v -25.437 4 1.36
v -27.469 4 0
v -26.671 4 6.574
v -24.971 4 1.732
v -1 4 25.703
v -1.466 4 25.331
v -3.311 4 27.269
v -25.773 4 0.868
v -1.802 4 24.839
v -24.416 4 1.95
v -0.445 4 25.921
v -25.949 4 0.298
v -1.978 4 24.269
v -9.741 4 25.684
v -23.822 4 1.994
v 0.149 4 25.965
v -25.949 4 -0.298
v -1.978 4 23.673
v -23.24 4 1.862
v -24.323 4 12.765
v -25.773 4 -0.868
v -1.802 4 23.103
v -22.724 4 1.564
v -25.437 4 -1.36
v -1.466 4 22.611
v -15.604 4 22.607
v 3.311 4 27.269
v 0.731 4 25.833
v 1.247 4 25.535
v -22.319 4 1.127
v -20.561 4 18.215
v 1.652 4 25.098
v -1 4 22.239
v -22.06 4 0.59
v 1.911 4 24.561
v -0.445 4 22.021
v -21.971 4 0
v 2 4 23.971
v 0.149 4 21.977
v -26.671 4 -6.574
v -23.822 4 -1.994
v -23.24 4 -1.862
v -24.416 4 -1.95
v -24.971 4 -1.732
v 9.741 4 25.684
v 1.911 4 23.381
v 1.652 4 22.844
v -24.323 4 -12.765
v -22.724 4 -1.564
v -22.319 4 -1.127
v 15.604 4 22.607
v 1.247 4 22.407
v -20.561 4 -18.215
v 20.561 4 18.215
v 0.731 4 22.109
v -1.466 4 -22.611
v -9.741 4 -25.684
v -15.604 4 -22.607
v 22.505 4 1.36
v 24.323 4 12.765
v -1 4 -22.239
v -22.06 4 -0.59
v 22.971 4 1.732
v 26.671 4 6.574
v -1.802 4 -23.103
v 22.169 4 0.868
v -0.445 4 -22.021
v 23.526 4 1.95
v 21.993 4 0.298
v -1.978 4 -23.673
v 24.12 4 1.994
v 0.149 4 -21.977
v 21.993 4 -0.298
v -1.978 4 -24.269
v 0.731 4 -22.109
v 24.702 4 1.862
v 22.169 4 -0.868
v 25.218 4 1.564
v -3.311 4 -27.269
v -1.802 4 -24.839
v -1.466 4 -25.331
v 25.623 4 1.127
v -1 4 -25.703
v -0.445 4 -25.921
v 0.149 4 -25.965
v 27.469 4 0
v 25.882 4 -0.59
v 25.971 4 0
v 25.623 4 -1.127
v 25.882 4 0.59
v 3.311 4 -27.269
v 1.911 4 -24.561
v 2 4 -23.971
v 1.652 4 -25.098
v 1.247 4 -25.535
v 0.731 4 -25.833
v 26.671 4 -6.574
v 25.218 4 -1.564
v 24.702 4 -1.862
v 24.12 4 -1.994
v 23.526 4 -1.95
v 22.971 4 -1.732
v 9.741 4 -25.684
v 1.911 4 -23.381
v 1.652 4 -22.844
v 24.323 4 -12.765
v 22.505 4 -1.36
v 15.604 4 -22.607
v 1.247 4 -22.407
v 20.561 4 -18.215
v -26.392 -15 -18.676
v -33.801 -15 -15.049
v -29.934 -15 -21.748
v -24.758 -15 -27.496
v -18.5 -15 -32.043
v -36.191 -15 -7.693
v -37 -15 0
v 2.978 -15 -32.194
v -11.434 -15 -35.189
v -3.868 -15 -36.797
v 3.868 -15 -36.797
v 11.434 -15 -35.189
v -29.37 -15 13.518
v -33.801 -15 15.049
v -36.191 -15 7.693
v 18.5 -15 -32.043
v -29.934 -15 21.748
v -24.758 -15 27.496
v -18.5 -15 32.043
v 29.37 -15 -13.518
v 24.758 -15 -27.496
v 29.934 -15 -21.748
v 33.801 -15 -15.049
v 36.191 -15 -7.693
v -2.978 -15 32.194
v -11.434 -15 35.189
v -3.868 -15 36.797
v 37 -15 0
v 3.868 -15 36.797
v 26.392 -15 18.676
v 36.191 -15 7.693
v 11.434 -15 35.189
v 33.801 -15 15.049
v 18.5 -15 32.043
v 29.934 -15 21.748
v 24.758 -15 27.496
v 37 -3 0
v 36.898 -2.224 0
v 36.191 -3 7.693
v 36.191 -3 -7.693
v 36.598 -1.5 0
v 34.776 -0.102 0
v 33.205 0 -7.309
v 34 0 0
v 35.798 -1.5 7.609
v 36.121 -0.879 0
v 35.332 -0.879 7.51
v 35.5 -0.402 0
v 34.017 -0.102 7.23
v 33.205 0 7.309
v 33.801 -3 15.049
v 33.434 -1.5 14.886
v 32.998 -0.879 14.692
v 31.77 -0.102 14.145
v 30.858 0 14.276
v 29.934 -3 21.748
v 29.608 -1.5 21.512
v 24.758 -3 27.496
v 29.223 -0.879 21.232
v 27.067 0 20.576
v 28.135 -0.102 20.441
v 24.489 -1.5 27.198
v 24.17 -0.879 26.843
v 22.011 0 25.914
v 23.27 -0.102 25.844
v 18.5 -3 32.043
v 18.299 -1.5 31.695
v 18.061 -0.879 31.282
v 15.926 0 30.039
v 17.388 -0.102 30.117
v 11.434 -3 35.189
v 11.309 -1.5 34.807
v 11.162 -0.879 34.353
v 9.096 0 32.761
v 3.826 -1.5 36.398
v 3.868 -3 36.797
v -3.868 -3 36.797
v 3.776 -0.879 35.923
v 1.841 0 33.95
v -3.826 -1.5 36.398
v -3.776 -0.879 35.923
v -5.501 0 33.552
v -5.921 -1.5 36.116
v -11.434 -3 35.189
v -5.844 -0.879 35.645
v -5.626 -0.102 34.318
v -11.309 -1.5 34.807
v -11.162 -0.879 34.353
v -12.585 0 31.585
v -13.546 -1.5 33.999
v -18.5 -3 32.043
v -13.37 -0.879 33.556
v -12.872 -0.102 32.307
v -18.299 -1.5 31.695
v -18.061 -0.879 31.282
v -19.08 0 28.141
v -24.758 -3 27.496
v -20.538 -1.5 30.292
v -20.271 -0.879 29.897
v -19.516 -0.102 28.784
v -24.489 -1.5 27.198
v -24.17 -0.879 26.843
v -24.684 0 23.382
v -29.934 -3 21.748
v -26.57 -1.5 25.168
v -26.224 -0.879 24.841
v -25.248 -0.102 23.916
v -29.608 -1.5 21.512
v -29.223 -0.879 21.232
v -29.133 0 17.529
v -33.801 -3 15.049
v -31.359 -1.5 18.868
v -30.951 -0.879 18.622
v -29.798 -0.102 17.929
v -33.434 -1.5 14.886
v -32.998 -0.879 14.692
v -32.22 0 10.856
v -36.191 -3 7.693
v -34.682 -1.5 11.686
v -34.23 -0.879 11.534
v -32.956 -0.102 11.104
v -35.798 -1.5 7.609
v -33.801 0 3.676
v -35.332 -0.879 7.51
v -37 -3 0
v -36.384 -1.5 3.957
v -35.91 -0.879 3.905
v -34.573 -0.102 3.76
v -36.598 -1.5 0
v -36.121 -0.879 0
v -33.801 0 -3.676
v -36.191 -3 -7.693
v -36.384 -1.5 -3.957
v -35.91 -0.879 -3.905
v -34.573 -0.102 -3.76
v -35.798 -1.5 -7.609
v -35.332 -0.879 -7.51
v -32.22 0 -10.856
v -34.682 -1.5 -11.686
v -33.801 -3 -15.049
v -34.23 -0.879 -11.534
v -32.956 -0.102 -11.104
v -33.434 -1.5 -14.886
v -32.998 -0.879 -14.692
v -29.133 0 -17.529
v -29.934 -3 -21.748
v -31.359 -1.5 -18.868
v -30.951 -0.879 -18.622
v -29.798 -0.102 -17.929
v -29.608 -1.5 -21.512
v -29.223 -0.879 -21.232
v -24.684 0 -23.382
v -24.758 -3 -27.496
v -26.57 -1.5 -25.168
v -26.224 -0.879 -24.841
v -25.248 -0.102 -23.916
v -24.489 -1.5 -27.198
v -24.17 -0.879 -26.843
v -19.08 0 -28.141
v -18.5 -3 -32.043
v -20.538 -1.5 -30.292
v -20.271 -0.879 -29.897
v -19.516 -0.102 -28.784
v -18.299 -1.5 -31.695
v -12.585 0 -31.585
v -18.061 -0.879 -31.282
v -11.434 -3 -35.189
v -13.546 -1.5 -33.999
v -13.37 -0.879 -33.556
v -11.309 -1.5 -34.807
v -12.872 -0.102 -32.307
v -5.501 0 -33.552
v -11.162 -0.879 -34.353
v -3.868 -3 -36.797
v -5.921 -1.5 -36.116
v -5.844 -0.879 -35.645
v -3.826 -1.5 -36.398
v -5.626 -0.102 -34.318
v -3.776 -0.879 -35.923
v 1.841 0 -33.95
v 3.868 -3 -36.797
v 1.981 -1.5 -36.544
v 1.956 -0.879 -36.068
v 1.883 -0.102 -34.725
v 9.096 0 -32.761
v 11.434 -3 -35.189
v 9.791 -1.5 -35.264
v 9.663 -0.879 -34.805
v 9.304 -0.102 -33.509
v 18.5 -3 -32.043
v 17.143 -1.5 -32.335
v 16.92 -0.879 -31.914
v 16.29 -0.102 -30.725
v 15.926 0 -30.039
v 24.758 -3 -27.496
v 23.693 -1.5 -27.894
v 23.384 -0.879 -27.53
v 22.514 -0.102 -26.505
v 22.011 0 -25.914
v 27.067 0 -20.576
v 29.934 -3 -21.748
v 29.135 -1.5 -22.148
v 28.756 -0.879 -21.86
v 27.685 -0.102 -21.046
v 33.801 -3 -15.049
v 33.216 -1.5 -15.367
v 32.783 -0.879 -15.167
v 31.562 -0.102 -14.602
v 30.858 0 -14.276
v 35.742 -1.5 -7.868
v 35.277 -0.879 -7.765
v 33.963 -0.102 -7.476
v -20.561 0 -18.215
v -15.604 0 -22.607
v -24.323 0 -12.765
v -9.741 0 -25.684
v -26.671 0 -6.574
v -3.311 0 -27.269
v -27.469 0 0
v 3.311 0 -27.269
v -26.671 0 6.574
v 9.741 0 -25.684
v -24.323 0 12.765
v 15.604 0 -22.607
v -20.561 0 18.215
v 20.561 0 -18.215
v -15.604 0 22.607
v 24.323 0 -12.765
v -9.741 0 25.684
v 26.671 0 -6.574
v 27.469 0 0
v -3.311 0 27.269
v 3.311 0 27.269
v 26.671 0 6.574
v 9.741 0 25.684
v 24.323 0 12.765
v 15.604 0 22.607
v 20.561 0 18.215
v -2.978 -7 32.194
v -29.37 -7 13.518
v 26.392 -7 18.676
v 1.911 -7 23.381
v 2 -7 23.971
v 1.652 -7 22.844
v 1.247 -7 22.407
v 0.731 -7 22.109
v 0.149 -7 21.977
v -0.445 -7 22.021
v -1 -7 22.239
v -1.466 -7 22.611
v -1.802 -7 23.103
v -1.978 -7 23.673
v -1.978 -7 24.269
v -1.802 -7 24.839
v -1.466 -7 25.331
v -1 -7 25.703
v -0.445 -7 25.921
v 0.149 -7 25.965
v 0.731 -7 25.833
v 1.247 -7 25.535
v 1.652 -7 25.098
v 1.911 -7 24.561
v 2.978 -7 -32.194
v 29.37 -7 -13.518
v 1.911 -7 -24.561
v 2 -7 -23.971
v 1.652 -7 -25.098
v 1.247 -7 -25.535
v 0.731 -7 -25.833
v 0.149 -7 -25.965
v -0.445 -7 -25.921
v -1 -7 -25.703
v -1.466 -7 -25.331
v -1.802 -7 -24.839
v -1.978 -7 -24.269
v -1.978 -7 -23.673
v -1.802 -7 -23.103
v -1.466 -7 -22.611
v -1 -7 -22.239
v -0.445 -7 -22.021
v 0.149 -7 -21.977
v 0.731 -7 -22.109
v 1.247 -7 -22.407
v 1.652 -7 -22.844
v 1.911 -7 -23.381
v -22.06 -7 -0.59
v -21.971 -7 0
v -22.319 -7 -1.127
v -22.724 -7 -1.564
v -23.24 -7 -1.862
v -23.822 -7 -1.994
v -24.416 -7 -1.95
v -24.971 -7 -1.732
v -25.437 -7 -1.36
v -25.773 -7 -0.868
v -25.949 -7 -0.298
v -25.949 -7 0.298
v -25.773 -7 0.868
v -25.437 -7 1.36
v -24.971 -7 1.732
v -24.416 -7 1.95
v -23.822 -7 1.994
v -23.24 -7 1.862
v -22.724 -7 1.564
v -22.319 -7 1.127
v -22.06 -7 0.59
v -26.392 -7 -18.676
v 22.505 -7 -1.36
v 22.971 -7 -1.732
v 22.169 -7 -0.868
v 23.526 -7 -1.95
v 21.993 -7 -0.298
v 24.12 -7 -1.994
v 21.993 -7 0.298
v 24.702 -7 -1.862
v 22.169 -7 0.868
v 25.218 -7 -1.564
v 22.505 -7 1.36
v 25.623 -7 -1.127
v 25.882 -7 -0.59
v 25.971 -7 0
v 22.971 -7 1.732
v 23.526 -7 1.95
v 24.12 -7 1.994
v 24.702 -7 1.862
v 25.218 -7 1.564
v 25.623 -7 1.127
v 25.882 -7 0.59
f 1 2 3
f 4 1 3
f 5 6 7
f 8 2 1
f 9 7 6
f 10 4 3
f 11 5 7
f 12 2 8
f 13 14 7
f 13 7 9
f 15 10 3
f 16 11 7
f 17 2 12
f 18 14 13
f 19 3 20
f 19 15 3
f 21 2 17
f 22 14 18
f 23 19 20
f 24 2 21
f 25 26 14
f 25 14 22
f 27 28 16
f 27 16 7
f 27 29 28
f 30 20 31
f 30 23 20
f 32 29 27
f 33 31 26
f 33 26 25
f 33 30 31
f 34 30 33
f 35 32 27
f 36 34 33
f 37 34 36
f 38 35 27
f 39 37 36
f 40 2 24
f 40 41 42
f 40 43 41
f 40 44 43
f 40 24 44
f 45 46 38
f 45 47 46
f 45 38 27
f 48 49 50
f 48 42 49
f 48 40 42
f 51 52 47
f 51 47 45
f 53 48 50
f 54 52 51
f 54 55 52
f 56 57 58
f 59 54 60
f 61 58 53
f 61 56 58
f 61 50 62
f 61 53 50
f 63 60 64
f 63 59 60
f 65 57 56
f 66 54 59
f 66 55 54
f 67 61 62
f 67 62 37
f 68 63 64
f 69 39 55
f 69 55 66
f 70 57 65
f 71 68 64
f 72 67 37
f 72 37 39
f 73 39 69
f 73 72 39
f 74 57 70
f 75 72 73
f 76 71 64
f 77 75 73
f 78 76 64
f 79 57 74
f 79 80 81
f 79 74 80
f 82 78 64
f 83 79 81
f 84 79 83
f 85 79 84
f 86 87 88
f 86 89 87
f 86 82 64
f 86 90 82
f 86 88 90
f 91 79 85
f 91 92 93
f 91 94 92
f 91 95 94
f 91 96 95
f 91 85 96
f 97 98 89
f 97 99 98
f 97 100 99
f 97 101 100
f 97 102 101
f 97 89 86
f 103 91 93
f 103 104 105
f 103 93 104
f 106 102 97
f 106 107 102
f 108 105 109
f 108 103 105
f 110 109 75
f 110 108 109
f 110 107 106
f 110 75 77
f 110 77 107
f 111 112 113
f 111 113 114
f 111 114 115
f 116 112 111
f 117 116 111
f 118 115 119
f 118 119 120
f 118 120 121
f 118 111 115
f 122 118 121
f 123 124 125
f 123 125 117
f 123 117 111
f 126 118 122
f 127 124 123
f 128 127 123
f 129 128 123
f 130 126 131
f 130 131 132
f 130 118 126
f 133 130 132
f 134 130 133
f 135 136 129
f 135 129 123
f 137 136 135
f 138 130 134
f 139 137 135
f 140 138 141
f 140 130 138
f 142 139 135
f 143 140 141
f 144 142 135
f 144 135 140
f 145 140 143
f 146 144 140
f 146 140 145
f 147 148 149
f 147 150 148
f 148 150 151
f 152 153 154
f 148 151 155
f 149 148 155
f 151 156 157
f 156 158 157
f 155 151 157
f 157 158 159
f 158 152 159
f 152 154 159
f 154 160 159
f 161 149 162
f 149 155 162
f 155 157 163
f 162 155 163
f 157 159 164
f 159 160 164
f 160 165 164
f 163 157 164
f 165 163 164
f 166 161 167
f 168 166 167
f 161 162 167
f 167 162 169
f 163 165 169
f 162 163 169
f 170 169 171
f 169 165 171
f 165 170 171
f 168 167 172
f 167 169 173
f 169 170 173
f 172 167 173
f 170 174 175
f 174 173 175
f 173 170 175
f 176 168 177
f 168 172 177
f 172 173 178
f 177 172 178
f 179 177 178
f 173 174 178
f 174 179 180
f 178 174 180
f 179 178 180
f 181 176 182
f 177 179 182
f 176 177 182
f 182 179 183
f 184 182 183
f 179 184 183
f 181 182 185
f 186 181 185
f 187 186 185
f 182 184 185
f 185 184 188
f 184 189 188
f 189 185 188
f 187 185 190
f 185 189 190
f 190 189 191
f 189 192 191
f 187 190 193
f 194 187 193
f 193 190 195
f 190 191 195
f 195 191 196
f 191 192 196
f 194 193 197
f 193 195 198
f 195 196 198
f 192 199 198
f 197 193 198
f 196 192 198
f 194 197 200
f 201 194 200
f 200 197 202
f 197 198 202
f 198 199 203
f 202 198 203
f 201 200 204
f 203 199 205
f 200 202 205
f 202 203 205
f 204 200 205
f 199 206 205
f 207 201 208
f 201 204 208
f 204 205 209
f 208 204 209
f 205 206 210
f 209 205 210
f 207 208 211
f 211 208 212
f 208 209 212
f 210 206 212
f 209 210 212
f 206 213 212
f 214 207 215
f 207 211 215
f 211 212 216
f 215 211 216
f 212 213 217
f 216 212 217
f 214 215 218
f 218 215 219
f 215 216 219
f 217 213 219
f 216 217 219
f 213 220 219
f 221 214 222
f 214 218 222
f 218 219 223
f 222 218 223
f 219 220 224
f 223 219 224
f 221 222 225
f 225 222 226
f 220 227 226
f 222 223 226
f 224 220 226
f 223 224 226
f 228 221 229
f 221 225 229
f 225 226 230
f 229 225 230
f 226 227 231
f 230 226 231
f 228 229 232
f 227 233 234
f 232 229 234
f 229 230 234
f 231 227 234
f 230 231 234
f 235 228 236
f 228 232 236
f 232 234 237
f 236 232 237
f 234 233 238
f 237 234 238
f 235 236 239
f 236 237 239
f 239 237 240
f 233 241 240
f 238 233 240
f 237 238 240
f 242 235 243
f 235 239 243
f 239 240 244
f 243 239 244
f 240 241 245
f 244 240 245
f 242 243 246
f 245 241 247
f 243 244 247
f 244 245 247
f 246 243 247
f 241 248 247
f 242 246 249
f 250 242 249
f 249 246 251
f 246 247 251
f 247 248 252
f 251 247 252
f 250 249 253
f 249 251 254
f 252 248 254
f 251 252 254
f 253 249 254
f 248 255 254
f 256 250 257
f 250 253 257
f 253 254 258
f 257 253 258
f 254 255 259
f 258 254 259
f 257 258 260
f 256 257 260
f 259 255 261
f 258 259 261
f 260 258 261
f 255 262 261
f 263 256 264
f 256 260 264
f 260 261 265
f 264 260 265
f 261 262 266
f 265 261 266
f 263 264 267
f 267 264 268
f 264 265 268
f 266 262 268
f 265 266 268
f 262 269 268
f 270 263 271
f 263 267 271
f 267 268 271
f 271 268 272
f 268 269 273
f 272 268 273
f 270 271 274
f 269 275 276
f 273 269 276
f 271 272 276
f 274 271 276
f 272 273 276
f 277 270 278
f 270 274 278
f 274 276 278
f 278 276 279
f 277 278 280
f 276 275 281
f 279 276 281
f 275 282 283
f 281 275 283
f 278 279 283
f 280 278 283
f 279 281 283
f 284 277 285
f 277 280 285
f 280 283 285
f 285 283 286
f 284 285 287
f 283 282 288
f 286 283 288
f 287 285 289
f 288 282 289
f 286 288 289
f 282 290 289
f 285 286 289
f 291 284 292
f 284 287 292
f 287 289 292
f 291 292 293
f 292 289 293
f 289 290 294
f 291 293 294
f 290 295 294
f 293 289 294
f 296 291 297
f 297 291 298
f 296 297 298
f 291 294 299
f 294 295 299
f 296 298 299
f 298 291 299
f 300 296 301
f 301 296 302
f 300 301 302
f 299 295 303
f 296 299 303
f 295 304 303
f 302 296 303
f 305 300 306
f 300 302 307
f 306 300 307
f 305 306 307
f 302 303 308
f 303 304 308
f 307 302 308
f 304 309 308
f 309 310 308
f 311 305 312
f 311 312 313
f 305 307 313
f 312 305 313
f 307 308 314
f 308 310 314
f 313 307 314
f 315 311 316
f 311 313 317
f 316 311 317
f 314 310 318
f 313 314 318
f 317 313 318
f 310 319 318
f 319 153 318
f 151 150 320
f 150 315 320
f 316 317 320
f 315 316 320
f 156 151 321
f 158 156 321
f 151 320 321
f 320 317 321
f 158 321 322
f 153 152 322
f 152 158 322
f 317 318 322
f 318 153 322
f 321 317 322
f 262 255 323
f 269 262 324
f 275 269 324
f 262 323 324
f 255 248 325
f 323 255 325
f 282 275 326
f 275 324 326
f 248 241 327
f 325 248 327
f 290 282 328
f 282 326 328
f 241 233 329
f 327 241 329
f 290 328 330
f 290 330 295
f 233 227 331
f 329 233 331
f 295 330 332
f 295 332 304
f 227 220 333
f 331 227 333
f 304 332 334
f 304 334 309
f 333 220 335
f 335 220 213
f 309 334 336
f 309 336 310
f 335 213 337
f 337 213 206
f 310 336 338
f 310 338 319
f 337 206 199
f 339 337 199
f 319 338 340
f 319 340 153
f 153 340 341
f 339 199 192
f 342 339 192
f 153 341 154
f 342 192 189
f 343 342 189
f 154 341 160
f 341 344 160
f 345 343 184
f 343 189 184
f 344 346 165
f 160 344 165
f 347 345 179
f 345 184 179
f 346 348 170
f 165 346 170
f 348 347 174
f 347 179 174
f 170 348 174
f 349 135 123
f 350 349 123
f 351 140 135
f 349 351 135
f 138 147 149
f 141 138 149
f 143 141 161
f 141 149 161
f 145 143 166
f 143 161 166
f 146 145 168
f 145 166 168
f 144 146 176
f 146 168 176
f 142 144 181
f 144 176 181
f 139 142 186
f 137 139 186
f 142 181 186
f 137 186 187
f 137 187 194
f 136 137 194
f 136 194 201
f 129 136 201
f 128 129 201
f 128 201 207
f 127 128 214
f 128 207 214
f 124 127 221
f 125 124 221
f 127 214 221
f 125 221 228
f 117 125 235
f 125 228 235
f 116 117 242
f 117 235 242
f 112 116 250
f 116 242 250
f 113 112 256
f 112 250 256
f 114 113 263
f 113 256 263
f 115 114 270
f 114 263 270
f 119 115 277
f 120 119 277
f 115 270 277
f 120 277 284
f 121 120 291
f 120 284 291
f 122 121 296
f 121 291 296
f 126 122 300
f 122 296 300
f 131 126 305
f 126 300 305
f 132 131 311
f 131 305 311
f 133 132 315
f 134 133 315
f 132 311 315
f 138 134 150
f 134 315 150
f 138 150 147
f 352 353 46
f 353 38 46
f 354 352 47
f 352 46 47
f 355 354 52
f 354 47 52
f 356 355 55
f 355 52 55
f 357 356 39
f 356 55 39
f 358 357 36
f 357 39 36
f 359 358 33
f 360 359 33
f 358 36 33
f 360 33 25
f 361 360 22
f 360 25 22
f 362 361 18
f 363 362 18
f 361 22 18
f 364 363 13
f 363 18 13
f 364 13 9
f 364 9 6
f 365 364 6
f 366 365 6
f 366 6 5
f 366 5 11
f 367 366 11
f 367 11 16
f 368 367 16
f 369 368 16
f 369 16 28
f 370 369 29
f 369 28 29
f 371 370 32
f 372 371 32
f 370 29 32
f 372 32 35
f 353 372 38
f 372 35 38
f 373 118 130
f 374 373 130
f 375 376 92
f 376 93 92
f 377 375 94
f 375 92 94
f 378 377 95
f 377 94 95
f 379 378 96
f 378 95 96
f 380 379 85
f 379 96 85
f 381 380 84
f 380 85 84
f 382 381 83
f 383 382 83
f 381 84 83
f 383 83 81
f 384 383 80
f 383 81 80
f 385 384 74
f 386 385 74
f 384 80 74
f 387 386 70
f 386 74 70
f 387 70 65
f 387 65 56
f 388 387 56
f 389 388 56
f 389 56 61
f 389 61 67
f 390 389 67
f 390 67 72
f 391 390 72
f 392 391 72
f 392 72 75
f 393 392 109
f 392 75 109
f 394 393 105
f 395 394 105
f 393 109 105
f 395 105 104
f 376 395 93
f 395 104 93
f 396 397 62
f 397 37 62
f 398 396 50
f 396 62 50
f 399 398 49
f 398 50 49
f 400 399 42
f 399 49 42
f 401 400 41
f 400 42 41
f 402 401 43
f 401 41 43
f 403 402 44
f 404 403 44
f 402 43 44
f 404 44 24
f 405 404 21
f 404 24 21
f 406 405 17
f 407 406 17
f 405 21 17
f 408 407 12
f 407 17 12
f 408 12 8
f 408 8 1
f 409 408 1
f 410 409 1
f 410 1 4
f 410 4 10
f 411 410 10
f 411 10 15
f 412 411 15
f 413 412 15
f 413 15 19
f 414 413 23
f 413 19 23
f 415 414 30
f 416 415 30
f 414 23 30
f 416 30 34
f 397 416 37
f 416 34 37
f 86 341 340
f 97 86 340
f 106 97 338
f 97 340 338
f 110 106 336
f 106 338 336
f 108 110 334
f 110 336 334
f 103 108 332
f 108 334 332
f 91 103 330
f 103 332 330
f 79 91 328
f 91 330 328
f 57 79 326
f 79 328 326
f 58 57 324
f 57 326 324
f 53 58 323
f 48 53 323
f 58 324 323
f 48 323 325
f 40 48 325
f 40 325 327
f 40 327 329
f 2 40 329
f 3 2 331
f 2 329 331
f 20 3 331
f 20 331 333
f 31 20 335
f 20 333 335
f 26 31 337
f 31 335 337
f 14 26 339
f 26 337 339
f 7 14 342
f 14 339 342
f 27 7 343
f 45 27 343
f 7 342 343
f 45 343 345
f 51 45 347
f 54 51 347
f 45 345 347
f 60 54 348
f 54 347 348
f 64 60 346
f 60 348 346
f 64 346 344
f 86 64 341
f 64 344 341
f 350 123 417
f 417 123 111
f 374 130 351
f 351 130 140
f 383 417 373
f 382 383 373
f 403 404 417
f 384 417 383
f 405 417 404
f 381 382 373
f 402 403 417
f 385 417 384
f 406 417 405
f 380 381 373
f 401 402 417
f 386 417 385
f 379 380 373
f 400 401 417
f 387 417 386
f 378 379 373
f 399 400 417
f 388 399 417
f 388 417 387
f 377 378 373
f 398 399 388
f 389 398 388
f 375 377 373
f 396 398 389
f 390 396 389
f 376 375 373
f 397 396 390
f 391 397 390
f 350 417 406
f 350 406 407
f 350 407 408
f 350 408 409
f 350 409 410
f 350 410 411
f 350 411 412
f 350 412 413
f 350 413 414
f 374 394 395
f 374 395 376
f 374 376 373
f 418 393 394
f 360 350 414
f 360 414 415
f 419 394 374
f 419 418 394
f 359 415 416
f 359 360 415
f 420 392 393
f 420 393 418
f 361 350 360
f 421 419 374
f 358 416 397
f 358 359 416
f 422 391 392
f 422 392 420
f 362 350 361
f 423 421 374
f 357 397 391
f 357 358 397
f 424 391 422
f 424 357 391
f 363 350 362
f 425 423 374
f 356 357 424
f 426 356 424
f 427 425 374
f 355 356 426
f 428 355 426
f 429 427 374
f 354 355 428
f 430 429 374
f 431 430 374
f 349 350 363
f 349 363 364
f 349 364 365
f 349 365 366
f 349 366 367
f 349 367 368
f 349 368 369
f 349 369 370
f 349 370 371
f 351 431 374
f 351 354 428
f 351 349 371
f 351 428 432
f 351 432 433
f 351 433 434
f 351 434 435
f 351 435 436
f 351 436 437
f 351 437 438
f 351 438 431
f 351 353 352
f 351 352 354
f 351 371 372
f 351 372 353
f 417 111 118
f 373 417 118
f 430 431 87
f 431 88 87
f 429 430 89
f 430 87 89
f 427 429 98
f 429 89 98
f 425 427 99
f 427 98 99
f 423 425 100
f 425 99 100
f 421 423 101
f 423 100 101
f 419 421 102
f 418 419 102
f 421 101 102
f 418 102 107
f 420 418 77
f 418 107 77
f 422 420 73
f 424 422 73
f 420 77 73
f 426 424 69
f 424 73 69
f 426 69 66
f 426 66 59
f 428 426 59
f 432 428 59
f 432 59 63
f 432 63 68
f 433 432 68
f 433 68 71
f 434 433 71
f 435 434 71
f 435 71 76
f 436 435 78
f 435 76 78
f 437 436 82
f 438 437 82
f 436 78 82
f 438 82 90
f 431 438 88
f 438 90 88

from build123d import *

# Parameters (mm, degrees)
SKETCH2_R           = 27.469
BOSS_EXTRUDE1_DEPTH = 4
SKETCH3_R           = 2
CUT_EXTRUDE1_DEPTH  = 5
SKETCH4_R           = 37
BOSS_EXTRUDE2_DEPTH = 15
CUT_EXTRUDE3_DEPTH  = 8
FILLET1_R           = 3
SKETCH7_R           = 2
CUT_EXTRUDE5_DEPTH  = 25


with BuildPart() as part:
    # Sketch2 → Boss-Extrude1 (new body)
    with BuildSketch(Plane(origin=(0, 0, 0), x_dir=(1, 0, 0), z_dir=(0, 1, 0))):
        Circle(SKETCH2_R)
    extrude(amount=BOSS_EXTRUDE1_DEPTH)

    # Sketch3 → Cut-Extrude1 (cut, through all)
    with BuildSketch(Plane(origin=(0, 4, 0), x_dir=(1, 0, 0), z_dir=(0, 1, 0))):
        with Locations((-23.971, 0)):
            Circle(SKETCH3_R)
        with Locations((0, 23.971)):
            Circle(SKETCH3_R)
        with Locations((23.971, 0)):
            Circle(SKETCH3_R)
        with Locations((0, -23.971)):
            Circle(SKETCH3_R)
    extrude(amount=-CUT_EXTRUDE1_DEPTH, mode=Mode.SUBTRACT)

    # Sketch4 → Boss-Extrude2 (add)
    with BuildSketch(Plane.XZ):
        Circle(SKETCH4_R)
    extrude(amount=BOSS_EXTRUDE2_DEPTH)

    # Sketch6 → Cut-Extrude3 (cut)
    with BuildSketch(Plane.XZ.offset(15)):
        Polygon((-29.369836479, 13.518359314), (-26.392160823, -18.675844839), (2.977675656, -32.194204153), (29.369836479, -13.518359314), (26.392160823, 18.675844839), (-2.977675656, 32.194204153), align=None)
    extrude(amount=-CUT_EXTRUDE3_DEPTH, mode=Mode.SUBTRACT)

    # Fillet1
    fillet1_edges = [part.edges().sort_by_distance(p)[0] for p in [
        (-37, 0, 0),
    ]]
    fillet(fillet1_edges, radius=FILLET1_R)

    # Sketch7 → Cut-Extrude5 (cut, through all)
    with BuildSketch(Plane(origin=(0, 9, 0), x_dir=(1, 0, 0), z_dir=(0, 1, 0))):
        with Locations((0, 23.971)):
            Circle(SKETCH7_R)
        with Locations((23.971, 0)):
            Circle(SKETCH7_R)
        with Locations((0, -23.971)):
            Circle(SKETCH7_R)
        with Locations((-23.971, 0)):
            Circle(SKETCH7_R)
    extrude(amount=-CUT_EXTRUDE5_DEPTH, mode=Mode.SUBTRACT)


solid = part.part
